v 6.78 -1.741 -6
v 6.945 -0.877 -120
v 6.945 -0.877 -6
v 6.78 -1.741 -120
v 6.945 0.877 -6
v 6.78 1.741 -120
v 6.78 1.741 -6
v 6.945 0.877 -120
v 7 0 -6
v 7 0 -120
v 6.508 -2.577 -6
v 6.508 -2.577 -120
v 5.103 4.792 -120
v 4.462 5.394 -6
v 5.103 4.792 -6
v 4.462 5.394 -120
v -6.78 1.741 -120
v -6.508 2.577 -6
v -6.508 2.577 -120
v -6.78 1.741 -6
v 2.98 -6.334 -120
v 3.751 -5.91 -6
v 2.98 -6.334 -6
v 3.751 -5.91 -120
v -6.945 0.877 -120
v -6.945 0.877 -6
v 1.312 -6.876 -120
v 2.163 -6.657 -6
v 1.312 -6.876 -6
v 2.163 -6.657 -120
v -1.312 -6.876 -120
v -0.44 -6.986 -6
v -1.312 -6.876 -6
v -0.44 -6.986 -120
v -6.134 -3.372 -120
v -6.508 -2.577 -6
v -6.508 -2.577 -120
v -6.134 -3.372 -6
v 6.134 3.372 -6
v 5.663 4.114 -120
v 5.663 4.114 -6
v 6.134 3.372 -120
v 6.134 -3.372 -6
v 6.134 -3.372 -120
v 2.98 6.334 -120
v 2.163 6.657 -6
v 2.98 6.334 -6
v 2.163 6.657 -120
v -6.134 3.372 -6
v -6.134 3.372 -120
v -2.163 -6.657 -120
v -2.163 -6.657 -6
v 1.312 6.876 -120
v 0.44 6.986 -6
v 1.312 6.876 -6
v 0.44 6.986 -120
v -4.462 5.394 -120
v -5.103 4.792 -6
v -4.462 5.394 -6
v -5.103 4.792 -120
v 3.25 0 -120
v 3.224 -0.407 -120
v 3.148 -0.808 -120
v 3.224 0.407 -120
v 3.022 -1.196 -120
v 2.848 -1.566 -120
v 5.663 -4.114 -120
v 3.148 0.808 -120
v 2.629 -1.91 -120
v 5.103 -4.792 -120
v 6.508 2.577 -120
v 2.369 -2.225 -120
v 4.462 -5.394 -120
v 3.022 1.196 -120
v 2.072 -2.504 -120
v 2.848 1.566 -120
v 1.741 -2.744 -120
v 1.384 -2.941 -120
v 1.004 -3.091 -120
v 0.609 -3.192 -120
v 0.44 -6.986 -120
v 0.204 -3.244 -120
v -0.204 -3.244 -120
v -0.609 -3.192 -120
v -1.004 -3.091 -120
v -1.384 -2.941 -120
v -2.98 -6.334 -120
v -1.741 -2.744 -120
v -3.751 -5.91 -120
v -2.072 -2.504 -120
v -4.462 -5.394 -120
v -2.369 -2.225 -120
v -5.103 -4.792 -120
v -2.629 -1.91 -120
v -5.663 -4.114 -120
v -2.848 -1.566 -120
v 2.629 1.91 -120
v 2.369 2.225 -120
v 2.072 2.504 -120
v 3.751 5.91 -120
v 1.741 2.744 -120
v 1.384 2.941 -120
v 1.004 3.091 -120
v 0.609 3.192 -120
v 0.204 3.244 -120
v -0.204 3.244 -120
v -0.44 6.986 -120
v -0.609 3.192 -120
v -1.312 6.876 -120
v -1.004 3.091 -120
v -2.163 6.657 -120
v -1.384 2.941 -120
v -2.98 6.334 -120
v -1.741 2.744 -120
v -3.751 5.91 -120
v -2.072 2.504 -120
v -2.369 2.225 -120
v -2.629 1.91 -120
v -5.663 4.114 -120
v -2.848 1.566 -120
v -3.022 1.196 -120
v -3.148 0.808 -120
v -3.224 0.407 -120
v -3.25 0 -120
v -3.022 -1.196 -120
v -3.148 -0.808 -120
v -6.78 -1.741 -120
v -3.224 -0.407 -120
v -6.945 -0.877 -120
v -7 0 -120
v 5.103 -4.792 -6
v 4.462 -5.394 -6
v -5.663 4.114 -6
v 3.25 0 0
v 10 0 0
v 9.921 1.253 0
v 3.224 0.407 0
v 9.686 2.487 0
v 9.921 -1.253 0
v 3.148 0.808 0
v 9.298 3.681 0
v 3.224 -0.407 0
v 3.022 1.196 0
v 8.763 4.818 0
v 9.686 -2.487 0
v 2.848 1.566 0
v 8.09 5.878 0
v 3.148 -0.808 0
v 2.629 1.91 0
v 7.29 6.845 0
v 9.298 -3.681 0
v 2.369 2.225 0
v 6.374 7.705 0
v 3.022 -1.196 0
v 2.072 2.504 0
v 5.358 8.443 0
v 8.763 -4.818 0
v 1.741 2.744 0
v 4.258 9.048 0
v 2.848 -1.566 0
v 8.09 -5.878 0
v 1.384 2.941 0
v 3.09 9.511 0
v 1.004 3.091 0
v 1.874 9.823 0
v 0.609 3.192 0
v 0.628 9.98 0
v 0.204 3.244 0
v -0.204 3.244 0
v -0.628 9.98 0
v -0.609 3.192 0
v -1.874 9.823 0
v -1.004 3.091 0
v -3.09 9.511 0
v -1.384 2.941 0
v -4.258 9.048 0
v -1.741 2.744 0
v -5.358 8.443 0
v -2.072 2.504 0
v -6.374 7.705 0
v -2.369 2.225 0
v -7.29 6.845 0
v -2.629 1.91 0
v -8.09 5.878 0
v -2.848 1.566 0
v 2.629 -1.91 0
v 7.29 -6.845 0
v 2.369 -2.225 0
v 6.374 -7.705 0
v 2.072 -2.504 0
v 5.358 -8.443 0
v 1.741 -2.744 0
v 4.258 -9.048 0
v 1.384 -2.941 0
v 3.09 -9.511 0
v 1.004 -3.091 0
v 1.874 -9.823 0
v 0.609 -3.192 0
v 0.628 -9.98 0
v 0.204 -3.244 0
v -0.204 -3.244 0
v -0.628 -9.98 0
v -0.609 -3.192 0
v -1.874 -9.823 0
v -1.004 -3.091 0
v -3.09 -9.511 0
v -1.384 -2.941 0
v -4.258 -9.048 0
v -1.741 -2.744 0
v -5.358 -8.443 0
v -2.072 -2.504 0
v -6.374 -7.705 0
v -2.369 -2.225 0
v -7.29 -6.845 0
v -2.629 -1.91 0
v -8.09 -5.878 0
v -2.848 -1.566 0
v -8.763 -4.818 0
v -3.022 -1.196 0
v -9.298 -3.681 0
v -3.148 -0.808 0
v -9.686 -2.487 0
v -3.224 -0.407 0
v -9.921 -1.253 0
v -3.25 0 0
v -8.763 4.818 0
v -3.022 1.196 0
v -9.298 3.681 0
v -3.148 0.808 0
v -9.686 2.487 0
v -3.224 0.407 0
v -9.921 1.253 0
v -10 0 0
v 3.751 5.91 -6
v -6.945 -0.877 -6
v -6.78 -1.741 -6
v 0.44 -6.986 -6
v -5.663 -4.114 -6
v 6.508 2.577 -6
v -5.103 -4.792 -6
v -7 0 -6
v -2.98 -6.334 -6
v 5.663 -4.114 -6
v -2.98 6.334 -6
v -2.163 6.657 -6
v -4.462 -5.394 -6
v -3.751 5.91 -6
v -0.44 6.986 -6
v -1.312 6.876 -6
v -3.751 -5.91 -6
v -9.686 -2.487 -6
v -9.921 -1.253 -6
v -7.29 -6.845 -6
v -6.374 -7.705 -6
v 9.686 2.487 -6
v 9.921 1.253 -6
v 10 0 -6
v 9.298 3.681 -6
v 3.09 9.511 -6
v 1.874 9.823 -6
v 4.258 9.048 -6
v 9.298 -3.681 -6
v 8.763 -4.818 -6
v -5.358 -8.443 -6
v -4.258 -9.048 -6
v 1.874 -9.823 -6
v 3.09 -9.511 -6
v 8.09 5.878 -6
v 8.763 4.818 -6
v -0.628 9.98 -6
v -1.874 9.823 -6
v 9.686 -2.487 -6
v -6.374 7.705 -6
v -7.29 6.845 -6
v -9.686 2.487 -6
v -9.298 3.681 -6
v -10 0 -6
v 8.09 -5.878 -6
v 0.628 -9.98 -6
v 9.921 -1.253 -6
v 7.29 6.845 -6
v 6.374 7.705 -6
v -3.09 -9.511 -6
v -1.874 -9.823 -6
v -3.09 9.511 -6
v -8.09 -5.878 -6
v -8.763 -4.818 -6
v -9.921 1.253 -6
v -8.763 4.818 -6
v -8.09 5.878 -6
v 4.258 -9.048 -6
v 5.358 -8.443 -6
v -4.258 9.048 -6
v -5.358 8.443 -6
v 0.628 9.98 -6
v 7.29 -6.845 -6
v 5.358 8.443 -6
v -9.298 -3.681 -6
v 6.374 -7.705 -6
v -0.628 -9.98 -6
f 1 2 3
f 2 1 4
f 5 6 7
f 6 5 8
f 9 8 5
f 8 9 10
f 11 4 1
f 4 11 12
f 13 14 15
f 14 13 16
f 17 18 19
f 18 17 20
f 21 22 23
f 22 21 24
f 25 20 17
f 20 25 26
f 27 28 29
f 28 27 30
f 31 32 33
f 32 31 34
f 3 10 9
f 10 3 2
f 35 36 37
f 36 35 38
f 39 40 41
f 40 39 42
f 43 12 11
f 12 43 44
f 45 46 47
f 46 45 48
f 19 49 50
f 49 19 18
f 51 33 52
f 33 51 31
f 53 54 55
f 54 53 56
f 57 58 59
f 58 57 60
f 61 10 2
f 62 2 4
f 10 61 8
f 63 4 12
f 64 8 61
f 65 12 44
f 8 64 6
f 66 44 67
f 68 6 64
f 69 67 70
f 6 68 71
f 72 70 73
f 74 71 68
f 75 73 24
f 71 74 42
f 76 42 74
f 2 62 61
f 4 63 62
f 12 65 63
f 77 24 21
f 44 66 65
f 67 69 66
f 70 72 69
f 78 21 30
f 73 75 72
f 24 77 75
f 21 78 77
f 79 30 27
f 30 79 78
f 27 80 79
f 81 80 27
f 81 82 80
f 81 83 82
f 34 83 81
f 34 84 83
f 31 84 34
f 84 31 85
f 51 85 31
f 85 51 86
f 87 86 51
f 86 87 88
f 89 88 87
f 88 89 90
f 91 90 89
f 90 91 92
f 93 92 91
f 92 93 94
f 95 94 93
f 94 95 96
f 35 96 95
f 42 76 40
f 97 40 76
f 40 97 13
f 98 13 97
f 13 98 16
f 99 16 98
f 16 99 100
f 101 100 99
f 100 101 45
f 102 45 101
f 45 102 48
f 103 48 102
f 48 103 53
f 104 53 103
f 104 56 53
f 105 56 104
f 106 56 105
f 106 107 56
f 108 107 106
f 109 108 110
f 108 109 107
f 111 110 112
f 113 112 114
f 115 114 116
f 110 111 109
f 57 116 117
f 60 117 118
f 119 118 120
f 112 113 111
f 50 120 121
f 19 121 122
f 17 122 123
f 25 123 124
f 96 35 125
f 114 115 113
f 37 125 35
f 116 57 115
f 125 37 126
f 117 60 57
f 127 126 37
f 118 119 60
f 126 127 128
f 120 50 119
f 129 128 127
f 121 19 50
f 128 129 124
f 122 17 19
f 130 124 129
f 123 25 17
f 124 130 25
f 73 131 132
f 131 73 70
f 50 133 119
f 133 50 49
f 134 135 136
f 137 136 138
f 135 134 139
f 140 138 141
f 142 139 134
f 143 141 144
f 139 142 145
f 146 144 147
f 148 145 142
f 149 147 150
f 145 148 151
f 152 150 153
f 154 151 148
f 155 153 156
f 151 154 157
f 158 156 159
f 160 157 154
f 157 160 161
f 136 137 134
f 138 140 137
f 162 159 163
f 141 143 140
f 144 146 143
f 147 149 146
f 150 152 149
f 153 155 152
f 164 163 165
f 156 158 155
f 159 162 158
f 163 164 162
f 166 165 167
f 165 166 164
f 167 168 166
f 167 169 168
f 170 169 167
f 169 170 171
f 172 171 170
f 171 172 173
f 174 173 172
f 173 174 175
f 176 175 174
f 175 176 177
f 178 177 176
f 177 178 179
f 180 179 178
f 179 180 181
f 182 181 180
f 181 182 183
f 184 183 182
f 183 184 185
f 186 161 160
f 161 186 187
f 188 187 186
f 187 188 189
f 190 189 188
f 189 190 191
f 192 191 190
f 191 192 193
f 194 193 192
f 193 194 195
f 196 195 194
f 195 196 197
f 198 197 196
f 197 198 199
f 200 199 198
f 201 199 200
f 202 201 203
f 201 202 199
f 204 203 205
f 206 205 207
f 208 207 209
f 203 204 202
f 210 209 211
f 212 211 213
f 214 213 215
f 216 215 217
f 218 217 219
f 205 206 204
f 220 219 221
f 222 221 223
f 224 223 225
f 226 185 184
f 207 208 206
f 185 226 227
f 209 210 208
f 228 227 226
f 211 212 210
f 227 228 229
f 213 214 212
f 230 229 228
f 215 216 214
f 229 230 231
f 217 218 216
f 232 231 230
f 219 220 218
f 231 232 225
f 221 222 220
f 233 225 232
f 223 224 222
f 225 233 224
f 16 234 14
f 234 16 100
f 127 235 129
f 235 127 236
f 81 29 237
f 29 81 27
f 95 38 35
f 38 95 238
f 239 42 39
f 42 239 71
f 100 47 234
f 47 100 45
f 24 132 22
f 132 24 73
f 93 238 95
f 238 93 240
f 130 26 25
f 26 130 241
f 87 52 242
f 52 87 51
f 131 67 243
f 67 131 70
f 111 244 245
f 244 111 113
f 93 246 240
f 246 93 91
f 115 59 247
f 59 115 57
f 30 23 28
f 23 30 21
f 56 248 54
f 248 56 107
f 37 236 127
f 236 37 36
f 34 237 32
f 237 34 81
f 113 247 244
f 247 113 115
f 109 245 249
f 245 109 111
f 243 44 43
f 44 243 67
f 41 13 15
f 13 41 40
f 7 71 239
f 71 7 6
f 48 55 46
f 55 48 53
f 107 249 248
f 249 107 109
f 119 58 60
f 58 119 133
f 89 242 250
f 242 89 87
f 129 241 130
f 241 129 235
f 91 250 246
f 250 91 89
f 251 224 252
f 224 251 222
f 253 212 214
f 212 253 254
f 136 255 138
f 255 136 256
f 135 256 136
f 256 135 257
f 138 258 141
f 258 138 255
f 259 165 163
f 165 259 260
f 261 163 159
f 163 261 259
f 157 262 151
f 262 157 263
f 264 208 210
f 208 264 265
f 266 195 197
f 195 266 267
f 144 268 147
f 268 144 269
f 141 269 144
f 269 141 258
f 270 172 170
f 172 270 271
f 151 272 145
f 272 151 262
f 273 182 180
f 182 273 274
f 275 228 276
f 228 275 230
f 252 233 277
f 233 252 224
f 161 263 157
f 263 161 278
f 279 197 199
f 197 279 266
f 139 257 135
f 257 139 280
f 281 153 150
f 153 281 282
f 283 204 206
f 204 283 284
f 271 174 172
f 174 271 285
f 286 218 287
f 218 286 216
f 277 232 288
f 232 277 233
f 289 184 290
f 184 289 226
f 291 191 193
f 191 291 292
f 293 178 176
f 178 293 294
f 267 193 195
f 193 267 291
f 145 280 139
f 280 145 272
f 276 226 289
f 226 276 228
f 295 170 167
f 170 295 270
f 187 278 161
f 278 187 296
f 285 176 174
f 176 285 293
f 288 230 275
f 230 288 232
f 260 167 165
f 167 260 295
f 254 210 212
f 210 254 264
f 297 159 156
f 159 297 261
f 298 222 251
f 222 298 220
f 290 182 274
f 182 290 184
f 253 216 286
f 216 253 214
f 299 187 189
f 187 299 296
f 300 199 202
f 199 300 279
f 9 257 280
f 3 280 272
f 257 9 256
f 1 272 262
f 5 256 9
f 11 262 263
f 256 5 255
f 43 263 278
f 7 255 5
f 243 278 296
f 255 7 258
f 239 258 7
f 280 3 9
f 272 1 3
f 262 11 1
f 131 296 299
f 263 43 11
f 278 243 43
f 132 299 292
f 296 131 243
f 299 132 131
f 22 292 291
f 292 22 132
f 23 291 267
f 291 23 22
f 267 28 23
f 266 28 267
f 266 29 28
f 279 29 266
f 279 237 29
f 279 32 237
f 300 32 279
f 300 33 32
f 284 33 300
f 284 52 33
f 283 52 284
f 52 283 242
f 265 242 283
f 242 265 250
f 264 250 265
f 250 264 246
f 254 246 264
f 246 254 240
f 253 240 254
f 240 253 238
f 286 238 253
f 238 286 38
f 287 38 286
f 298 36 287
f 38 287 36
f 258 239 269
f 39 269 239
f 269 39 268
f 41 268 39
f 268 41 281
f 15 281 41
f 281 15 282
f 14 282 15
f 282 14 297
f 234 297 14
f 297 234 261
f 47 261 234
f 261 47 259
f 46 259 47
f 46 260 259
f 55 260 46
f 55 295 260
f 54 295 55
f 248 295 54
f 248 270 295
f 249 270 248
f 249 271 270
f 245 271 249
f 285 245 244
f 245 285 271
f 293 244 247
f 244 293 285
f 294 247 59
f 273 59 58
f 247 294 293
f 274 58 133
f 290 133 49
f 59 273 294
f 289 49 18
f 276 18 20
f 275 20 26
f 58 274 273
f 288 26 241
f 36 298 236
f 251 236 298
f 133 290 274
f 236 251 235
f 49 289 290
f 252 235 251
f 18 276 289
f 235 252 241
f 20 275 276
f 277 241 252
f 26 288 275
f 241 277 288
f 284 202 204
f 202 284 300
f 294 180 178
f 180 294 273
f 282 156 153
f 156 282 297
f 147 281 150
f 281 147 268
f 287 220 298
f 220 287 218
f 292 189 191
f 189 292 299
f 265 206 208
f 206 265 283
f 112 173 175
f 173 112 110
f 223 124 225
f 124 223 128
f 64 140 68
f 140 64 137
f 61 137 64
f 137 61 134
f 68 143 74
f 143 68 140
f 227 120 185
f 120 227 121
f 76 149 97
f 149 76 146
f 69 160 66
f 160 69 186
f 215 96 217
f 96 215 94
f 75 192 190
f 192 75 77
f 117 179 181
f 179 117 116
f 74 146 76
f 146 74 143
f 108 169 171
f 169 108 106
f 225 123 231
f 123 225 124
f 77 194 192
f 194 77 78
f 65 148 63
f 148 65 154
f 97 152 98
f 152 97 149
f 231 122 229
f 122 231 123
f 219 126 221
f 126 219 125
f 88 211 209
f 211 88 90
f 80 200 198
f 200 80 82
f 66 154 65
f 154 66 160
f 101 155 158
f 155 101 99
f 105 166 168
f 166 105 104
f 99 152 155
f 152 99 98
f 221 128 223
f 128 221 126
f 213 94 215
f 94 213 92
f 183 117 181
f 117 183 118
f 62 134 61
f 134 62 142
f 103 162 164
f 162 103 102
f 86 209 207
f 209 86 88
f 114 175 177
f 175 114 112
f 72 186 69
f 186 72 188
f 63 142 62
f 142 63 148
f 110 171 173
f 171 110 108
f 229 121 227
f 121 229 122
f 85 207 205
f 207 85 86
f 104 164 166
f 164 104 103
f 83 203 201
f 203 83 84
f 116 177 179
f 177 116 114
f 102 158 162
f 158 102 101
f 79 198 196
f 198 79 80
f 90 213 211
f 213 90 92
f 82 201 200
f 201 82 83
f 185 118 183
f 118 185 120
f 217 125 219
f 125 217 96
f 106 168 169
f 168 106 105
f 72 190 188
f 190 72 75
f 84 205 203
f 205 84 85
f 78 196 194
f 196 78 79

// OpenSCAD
$fn = 50;


difference() {
	union() {
		translate(v = [0, 0, -120.0000000000]) {
			cylinder(h = 120, r = 7.0000000000);
		}
		translate(v = [0, 0, -6.0000000000]) {
			cylinder(h = 6, r = 10.0000000000);
		}
	}
	union() {
		#translate(v = [0, 0, -120]) {
			cylinder(h = 120, r = 3.2500000000);
		}
	}
}
